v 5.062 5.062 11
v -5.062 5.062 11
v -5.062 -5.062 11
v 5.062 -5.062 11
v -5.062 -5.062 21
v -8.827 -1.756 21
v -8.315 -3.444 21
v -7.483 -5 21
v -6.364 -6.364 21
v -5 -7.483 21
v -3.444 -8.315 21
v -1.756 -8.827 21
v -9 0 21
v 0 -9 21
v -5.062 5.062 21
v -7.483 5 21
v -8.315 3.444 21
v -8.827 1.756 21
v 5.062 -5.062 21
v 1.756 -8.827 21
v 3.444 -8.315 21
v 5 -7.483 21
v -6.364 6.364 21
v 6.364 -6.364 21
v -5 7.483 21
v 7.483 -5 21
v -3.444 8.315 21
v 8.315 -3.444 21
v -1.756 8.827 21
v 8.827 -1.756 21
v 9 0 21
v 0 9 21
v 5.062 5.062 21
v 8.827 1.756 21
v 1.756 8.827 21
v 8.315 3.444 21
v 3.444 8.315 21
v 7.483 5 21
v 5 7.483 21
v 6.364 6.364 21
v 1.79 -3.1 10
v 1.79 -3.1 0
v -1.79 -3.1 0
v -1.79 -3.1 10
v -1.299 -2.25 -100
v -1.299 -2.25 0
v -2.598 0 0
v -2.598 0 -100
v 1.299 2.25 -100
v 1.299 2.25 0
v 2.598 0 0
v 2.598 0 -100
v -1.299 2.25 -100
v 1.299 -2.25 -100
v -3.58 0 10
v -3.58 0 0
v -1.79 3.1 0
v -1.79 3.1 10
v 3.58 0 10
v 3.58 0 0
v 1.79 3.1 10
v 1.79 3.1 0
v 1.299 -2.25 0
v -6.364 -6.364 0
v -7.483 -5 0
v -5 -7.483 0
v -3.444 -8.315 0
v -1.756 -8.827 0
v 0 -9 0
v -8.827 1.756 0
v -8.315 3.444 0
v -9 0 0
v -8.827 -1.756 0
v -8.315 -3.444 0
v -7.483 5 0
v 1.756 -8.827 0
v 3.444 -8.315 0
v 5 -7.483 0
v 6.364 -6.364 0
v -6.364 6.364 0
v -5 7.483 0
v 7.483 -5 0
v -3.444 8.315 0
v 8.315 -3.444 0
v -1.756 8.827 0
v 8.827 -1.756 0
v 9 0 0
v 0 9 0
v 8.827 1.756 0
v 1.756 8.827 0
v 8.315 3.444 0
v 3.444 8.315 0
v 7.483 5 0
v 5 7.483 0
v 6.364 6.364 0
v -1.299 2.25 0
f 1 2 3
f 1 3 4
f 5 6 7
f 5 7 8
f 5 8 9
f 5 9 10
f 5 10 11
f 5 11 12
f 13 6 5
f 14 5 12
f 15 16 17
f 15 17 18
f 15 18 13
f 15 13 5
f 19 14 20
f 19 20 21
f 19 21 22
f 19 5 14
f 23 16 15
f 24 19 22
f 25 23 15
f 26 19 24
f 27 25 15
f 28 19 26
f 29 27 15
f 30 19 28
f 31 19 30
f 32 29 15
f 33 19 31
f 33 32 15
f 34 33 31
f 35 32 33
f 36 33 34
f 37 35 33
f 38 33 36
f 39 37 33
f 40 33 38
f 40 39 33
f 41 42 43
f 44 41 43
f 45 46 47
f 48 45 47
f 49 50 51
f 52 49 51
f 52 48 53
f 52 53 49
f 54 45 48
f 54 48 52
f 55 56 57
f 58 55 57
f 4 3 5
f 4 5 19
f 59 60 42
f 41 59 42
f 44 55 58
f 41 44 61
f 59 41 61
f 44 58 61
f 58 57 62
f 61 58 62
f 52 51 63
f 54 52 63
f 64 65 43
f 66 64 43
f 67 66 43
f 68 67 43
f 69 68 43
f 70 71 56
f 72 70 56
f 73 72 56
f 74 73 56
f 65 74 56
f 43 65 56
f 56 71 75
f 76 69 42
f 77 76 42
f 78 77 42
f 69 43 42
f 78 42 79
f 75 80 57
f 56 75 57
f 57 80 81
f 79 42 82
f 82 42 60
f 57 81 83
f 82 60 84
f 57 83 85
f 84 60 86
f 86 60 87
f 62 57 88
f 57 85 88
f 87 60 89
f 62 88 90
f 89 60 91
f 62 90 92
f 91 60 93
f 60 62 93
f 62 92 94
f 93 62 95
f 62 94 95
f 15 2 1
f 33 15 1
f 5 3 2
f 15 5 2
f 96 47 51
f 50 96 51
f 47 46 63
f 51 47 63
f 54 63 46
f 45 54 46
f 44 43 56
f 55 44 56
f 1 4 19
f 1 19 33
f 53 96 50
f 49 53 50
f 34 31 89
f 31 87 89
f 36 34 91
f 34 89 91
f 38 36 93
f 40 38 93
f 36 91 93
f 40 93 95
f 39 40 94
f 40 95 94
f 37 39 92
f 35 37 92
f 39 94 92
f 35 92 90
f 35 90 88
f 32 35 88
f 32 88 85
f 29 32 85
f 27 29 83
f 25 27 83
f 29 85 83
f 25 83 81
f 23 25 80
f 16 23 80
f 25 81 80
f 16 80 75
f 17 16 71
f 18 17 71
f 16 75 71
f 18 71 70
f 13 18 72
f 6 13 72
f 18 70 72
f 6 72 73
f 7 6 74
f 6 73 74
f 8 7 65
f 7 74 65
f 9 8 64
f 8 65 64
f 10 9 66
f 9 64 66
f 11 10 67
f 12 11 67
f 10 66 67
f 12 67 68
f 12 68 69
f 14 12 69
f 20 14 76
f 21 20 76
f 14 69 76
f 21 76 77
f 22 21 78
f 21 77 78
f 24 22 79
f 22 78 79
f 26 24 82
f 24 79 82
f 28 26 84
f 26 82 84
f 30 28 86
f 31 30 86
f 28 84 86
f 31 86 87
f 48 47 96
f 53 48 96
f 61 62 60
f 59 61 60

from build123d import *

# Parameters (mm, degrees)
F0_R     = 9
F1_DEPTH = 10
F2_R     = 9
F3_DEPTH = 1
F4_R     = 9
F4_W     = 10.125
F4_H     = 10.125
F5_DEPTH = 10
F7_DEPTH = 100


with BuildPart() as f1:
    # F0 (on Top) → F1 (new body)
    with BuildSketch(Plane.XY):
        Circle(F0_R)
        Polygon((-1.789786, -3.1), (-3.579572, 0), (-1.789786, 3.1), (1.789786, 3.1), (3.579572, 0), (1.789786, -3.1), align=None, mode=Mode.SUBTRACT)
    extrude(amount=F1_DEPTH)

    # F2 (on face) → F3 (join)
    with BuildSketch(Plane.XY.offset(10)):
        Circle(F2_R)
    extrude(amount=F3_DEPTH)

    # F4 (on face) → F5 (join)
    with BuildSketch(Plane.XY.offset(11)):
        Circle(F4_R)
        Rectangle(F4_W, F4_H, mode=Mode.SUBTRACT)
    extrude(amount=F5_DEPTH)


with BuildPart() as f7:
    # F6 (on face) → F7 (new body)
    with BuildSketch(Plane(origin=(0, 0, 0), x_dir=(1, 0, 0), z_dir=(0, 0, -1))):
        Polygon((-2.598076, 0), (-1.299038, -2.25), (1.299038, -2.25), (2.598076, 0), (1.299038, 2.25), (-1.299038, 2.25), align=None)
    extrude(amount=F7_DEPTH)


solid = Compound([f1.part, f7.part])
